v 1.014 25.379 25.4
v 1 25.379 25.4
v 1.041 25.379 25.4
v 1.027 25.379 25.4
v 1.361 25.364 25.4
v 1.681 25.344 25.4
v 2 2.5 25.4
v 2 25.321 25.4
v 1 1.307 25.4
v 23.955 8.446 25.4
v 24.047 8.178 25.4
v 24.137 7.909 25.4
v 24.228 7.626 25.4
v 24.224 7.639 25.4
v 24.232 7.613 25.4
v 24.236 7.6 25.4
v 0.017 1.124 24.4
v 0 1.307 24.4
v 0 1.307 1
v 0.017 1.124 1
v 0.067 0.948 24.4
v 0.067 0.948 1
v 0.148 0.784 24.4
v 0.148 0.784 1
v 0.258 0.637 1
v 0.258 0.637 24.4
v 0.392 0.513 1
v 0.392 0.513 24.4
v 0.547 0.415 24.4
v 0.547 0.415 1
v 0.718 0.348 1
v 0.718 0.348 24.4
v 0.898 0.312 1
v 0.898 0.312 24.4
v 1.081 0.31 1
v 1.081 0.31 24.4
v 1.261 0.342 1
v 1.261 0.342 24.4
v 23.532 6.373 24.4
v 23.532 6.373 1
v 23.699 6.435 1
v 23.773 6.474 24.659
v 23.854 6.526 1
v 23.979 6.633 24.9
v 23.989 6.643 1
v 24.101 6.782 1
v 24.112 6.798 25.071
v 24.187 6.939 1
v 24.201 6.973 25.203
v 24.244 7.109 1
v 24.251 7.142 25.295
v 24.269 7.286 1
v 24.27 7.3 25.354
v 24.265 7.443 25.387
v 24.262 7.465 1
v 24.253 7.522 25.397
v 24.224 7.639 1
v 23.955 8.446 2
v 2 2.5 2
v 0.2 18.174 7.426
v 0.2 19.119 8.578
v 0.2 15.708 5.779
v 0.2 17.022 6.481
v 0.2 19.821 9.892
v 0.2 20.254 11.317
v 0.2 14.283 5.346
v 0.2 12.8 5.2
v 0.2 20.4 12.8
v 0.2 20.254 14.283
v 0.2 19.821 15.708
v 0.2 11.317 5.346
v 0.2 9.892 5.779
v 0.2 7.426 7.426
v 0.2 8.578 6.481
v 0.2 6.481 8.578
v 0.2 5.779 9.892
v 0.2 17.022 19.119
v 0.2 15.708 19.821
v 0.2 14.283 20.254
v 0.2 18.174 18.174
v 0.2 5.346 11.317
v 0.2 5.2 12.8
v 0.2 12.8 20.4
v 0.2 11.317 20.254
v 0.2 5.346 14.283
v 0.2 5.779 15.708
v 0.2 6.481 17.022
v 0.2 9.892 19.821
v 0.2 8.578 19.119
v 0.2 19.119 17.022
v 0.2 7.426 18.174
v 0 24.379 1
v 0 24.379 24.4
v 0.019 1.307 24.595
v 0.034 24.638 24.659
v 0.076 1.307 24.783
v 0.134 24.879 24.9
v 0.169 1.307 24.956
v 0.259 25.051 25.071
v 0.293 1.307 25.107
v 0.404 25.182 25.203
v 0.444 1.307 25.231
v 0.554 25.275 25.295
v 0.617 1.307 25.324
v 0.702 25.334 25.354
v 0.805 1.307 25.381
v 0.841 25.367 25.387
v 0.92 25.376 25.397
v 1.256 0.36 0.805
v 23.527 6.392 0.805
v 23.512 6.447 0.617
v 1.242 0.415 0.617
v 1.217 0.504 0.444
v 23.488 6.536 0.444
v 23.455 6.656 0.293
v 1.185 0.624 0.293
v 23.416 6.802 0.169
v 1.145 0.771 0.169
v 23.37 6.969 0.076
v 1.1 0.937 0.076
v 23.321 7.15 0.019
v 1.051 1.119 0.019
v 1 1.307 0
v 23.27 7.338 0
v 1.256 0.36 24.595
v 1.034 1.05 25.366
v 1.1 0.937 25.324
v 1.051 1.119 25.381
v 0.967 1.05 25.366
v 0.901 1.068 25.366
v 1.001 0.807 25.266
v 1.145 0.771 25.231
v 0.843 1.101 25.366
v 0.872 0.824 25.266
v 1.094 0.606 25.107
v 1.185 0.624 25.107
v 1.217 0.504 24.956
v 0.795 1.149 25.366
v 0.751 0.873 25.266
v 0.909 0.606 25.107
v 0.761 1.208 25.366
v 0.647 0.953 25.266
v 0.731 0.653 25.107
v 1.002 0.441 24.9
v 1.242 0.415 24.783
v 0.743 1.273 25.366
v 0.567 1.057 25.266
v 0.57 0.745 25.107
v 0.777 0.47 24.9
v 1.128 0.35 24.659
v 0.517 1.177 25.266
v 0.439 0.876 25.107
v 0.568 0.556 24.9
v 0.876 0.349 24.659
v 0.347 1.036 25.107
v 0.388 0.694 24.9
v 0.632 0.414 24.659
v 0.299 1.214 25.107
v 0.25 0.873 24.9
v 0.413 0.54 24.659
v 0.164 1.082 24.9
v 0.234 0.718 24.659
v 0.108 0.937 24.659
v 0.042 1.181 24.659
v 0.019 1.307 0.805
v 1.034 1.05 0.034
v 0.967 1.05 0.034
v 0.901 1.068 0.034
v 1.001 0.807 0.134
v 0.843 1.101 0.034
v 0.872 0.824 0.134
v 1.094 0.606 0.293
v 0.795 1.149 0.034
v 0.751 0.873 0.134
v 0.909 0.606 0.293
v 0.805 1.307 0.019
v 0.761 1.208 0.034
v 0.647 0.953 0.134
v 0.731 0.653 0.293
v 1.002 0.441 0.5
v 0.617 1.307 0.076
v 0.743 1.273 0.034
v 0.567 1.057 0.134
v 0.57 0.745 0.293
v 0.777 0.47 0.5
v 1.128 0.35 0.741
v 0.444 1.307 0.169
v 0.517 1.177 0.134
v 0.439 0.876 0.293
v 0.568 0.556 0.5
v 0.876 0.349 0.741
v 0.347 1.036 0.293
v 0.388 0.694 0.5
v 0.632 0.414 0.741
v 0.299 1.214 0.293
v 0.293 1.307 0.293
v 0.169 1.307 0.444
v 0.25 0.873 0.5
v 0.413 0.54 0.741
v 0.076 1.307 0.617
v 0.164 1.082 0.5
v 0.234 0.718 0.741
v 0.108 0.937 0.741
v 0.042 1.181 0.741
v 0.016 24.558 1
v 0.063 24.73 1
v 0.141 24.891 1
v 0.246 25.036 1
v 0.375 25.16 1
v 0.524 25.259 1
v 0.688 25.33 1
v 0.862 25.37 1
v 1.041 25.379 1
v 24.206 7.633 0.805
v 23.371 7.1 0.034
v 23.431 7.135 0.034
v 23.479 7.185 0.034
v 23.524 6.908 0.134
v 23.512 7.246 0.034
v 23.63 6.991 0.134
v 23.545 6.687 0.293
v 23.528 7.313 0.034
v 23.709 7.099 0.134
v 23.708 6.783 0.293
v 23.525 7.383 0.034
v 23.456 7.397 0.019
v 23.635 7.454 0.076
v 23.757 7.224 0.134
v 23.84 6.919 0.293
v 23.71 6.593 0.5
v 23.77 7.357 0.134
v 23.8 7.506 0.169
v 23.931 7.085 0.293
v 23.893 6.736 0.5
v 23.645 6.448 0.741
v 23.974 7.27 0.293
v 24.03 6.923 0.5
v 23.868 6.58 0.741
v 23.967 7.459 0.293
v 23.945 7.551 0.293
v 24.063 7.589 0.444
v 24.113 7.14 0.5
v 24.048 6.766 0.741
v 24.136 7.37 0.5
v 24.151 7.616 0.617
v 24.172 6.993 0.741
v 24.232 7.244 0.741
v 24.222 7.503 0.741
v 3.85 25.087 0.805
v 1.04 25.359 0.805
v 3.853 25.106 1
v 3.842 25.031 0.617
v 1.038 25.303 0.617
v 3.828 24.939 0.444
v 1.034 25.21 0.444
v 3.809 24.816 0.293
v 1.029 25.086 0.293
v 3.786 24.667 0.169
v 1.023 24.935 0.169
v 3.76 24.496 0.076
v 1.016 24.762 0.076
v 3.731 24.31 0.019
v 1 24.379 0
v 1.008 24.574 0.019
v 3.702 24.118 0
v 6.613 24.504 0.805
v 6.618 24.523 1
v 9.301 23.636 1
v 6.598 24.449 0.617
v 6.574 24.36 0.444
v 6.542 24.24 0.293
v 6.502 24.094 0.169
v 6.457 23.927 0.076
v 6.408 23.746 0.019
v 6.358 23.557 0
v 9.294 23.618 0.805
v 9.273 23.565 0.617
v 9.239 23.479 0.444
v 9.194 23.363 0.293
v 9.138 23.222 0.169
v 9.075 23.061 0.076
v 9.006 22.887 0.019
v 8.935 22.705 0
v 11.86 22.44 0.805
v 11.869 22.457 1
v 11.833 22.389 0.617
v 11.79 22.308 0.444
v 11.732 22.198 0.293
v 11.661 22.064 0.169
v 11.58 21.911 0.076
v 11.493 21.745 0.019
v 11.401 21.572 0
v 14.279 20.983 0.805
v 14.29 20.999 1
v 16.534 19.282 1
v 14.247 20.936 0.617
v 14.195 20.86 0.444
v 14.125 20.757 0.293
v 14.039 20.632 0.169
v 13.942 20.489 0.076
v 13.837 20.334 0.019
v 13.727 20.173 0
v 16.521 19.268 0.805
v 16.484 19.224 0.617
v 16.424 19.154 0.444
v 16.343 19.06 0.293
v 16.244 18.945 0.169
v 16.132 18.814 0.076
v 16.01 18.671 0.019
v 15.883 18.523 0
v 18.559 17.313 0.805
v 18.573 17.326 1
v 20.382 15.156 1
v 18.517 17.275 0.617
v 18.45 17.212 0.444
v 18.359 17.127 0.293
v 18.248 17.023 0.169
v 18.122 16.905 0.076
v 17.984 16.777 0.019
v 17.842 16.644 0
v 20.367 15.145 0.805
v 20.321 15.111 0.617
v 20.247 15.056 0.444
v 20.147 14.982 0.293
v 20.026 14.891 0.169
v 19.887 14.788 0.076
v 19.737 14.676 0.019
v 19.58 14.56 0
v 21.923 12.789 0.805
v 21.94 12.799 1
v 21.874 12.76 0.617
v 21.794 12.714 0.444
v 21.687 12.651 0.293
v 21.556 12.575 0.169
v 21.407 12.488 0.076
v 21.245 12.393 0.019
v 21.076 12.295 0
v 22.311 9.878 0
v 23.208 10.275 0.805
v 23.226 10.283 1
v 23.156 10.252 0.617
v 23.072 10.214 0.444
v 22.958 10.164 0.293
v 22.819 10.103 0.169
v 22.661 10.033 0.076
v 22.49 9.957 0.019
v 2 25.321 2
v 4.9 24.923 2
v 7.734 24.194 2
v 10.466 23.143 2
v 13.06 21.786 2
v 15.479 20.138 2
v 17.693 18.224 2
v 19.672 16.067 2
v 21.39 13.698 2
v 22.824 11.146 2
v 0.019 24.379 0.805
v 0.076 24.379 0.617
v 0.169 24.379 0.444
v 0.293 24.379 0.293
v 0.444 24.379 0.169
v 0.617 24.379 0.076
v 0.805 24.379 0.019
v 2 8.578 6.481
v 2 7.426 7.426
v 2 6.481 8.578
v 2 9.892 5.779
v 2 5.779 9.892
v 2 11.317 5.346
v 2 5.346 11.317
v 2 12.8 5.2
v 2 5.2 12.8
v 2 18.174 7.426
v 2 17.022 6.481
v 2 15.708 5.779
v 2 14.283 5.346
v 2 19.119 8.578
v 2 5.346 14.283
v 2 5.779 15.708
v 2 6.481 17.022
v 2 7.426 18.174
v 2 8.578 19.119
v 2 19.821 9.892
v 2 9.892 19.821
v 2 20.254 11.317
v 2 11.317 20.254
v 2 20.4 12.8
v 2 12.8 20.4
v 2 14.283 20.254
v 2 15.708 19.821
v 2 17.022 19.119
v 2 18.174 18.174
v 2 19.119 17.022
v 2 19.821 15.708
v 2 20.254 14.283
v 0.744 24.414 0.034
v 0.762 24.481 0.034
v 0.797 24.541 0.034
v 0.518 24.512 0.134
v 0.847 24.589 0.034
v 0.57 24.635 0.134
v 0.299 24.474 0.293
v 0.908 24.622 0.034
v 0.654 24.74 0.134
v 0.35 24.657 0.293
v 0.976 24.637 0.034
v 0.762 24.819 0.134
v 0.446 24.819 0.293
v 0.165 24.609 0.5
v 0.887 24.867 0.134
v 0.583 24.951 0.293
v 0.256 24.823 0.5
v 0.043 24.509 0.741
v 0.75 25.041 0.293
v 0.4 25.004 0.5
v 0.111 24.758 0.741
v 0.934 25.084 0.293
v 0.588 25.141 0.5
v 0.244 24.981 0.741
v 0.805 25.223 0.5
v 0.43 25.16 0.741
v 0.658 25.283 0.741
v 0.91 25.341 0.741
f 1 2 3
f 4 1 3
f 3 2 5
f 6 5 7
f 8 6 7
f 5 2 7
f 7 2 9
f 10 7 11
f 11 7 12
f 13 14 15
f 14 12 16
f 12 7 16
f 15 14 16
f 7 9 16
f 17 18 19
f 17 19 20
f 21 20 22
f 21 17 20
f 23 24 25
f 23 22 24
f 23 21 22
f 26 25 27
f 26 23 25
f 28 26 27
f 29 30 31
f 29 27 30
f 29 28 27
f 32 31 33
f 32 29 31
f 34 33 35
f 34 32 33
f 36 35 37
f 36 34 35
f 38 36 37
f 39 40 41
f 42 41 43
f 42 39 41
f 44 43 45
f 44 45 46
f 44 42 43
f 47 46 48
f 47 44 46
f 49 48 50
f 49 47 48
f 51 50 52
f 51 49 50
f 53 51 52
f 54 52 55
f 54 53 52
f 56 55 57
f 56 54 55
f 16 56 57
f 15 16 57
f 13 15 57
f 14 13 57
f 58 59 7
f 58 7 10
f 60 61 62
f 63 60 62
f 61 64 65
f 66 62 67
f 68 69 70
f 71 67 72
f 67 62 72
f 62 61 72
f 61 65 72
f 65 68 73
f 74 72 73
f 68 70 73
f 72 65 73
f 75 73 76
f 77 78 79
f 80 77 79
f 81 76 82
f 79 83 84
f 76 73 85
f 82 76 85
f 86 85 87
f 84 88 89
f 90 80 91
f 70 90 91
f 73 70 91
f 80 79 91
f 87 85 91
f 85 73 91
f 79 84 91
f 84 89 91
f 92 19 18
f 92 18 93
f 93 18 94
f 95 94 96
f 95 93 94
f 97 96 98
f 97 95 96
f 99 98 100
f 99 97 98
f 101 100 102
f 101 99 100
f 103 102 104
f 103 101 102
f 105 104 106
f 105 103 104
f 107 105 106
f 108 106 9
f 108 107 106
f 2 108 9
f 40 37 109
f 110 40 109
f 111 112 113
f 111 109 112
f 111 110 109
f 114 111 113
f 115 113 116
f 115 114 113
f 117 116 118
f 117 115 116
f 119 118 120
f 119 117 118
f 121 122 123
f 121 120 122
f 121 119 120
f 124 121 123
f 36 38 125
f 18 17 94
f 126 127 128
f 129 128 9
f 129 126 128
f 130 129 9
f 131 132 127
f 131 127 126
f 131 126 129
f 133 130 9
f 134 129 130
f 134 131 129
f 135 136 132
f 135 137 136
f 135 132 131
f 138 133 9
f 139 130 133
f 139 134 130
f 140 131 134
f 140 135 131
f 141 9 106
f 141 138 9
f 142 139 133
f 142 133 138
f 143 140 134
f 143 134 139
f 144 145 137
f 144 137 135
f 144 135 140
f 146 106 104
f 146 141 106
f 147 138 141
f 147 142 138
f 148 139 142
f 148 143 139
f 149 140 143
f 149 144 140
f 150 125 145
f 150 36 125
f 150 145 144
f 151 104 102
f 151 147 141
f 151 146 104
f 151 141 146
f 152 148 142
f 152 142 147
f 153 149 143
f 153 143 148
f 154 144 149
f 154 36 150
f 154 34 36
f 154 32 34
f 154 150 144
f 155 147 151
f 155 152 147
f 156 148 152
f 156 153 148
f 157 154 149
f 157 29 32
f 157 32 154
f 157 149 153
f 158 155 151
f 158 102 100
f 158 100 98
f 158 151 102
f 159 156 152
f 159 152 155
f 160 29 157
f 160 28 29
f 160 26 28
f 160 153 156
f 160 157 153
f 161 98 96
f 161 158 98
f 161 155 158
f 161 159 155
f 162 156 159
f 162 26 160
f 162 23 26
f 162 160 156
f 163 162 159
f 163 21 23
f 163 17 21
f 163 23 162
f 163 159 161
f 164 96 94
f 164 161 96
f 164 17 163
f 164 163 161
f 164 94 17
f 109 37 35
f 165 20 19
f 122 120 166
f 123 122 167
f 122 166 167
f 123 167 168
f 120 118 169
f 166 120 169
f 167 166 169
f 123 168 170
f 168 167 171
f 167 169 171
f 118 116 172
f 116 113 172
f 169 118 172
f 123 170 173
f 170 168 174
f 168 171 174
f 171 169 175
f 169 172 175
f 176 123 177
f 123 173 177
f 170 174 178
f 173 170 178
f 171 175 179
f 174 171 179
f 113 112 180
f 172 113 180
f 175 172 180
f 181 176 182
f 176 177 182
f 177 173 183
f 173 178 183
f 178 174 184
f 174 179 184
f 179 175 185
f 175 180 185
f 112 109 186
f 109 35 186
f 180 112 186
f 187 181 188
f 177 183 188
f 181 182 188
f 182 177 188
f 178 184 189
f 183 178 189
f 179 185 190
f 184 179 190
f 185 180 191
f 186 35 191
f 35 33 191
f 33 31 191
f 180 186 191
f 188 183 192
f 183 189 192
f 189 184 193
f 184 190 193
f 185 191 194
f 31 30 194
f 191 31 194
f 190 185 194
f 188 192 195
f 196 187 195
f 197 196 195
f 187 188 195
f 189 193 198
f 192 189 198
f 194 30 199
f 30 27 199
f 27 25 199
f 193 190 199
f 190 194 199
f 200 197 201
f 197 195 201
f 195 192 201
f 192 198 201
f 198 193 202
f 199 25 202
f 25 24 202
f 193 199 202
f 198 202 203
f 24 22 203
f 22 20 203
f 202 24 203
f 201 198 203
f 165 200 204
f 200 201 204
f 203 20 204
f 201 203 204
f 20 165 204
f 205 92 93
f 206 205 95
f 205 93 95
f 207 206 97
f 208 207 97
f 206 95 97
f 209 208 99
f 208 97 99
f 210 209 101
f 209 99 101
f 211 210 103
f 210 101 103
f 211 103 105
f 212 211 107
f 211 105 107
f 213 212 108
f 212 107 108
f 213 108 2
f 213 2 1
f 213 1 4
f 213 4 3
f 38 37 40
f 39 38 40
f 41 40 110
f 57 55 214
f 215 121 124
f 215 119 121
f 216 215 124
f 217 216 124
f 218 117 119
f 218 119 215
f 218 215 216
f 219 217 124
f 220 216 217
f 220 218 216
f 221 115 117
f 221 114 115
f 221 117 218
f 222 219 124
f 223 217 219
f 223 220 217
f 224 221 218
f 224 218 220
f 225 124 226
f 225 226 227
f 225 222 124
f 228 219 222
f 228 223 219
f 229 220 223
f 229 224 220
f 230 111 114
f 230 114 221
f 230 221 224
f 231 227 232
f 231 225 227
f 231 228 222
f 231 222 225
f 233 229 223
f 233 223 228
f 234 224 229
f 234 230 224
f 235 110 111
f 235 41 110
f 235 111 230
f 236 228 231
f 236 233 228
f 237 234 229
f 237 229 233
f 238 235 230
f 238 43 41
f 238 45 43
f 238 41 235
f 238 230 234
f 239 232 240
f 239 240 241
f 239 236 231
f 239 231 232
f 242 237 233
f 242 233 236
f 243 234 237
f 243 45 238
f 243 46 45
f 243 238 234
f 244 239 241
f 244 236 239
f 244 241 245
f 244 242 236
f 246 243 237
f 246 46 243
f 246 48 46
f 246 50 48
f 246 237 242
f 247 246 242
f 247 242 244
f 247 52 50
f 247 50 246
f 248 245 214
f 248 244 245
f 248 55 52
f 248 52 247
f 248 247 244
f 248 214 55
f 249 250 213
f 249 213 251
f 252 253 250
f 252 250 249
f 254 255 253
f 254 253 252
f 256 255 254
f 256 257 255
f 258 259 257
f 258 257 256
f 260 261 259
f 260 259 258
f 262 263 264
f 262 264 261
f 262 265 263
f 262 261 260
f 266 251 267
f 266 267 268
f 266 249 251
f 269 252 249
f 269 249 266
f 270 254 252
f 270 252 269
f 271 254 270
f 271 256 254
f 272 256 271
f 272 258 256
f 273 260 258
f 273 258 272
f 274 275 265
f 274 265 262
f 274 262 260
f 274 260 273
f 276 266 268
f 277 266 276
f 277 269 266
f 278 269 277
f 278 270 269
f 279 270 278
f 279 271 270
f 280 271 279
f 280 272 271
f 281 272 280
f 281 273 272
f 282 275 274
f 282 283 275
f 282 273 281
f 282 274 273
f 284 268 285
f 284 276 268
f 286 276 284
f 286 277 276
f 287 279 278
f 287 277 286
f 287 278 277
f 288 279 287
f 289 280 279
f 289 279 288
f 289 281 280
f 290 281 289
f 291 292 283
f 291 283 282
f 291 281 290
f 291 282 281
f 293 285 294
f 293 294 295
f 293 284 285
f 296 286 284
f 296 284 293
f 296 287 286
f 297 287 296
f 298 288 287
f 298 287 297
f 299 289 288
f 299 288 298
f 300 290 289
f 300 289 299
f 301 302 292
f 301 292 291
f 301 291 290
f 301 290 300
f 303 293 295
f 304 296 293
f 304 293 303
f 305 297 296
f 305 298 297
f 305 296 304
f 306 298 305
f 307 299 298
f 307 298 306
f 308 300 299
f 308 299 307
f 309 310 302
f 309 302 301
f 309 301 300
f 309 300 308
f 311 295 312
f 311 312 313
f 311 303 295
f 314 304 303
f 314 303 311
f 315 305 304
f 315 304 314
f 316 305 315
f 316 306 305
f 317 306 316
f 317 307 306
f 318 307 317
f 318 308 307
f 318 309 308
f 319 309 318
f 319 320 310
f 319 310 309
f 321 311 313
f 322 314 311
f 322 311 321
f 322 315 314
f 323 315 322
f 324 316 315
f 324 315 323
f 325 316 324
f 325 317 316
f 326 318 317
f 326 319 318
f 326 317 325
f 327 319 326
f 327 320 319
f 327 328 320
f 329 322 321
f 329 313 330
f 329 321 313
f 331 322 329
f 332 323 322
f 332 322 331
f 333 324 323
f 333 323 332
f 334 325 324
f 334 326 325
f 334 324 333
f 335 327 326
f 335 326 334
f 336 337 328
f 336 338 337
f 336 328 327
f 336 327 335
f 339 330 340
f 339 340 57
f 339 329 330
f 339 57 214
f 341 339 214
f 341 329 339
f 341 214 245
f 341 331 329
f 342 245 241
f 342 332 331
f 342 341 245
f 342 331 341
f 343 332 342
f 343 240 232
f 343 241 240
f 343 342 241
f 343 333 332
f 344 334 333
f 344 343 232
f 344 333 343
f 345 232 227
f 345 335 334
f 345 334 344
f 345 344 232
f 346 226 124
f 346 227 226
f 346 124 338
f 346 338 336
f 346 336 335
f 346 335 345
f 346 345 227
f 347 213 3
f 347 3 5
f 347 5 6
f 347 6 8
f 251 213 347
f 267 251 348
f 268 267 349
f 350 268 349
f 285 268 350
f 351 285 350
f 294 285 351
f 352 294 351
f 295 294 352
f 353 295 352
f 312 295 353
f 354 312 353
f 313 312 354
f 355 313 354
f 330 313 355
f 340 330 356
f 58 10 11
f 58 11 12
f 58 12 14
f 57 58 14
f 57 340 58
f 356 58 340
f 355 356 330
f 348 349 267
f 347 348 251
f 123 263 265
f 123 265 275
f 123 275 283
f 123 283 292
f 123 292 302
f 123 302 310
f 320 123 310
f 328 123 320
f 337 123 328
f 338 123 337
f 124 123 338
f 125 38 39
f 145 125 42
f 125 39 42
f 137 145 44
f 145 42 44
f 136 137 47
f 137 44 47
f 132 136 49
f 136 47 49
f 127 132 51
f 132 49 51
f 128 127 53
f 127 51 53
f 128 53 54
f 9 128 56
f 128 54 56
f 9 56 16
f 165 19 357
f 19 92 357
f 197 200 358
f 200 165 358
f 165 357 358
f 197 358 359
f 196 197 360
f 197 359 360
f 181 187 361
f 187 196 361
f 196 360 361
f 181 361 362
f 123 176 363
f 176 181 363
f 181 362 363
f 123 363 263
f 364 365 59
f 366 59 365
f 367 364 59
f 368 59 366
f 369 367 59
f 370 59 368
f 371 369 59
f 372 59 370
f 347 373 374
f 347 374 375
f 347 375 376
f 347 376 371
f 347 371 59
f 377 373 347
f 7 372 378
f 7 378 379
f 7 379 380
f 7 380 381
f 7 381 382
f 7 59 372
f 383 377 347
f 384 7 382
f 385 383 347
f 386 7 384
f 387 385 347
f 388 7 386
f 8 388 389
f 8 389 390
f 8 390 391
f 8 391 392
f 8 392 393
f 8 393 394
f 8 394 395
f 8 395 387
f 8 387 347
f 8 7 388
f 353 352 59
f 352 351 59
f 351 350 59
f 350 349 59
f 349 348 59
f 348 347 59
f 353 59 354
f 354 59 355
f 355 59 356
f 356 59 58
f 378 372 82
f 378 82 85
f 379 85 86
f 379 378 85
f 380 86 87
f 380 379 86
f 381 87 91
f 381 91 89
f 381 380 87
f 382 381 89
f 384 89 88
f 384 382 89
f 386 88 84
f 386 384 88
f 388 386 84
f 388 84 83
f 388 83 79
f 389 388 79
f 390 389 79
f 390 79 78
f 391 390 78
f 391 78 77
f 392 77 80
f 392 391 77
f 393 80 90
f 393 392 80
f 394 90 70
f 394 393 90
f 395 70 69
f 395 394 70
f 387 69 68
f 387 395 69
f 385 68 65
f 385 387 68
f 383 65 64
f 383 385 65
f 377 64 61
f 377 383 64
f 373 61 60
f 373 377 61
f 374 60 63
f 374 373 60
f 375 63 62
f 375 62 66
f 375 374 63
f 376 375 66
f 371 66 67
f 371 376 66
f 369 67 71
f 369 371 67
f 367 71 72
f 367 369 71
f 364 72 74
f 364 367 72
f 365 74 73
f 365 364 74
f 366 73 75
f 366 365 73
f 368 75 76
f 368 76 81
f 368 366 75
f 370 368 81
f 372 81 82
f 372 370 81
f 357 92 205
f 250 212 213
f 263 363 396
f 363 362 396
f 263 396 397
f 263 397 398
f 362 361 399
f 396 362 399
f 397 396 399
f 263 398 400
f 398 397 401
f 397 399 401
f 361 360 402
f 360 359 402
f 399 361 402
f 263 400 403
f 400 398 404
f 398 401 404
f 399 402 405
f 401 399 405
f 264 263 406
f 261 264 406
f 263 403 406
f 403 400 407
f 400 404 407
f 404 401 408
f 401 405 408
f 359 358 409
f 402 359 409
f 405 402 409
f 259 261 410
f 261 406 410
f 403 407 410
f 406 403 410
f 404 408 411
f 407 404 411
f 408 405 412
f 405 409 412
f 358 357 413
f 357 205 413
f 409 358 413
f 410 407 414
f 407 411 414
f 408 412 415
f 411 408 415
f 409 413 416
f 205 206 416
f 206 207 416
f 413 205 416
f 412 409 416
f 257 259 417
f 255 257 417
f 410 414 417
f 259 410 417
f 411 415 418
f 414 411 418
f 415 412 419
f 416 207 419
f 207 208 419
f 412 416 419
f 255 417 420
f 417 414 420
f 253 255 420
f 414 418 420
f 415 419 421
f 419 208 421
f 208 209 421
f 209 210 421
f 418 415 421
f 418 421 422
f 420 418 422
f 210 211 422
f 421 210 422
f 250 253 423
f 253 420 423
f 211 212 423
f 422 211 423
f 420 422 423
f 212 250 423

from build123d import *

# Parameters (mm, degrees)
PAD_DEPTH       = 25.4
POCKET_DEPTH    = 23.4
SKETCH002_R     = 7.6
POCKET001_DEPTH = 1.8
FILLET_R        = 1


with BuildPart() as corner:
    # Sketch → Pad (new body)
    with BuildSketch(Plane.XY):
        with BuildLine():
            Line((0, 0), (0, -25.4))
            ThreePointArc((0, -25.4), (15.435414, -20.171961), (24.516737, -6.64))
            Line((0, 0), (24.516737, -6.64))
        make_face()
    extrude(amount=PAD_DEPTH)

    # Sketch001 (on Face5 of Pad) → Pocket (cut)
    with BuildSketch(Plane.XY.offset(25.4)):
        with BuildLine():
            Line((2, -2.5), (2, -27.9))
            ThreePointArc((2, -27.9), (17.435414, -22.671961), (26.516737, -9.14))
            Line((2, -2.5), (26.516737, -9.14))
        make_face()
    extrude(amount=-POCKET_DEPTH, mode=Mode.SUBTRACT)

    # Sketch002 (on Face8 of Pocket) → Pocket001 (cut)
    with BuildSketch(Plane.YZ.offset(2)):
        with Locations((-12.8, 12.8)):
            Circle(SKETCH002_R)
    extrude(amount=-POCKET001_DEPTH, mode=Mode.SUBTRACT)

    # Fillet
    fillet_edges = [corner.edges().sort_by_distance(p)[0] for p in [
        (0, 0, 12.7),
        (12.258369, -3.32, 25.4),
        (24.516737, -6.64, 12.7),
        (12.258369, -3.32, 0),
        (0, -12.7, 0),
        (15.435414, -20.171961, 0),
        (0, -25.4, 12.7),
        (0, -12.7, 25.4),
    ]]
    fillet(fillet_edges, radius=FILLET_R)


with BuildPart() as part_mirroring:
    # Part__Mirroring: instance of Corner
    add(corner.part.mirror(Plane(origin=(0, 0, 0), x_dir=(1, 0, 0), z_dir=(0, 1, 0))))


solid = part_mirroring.part
